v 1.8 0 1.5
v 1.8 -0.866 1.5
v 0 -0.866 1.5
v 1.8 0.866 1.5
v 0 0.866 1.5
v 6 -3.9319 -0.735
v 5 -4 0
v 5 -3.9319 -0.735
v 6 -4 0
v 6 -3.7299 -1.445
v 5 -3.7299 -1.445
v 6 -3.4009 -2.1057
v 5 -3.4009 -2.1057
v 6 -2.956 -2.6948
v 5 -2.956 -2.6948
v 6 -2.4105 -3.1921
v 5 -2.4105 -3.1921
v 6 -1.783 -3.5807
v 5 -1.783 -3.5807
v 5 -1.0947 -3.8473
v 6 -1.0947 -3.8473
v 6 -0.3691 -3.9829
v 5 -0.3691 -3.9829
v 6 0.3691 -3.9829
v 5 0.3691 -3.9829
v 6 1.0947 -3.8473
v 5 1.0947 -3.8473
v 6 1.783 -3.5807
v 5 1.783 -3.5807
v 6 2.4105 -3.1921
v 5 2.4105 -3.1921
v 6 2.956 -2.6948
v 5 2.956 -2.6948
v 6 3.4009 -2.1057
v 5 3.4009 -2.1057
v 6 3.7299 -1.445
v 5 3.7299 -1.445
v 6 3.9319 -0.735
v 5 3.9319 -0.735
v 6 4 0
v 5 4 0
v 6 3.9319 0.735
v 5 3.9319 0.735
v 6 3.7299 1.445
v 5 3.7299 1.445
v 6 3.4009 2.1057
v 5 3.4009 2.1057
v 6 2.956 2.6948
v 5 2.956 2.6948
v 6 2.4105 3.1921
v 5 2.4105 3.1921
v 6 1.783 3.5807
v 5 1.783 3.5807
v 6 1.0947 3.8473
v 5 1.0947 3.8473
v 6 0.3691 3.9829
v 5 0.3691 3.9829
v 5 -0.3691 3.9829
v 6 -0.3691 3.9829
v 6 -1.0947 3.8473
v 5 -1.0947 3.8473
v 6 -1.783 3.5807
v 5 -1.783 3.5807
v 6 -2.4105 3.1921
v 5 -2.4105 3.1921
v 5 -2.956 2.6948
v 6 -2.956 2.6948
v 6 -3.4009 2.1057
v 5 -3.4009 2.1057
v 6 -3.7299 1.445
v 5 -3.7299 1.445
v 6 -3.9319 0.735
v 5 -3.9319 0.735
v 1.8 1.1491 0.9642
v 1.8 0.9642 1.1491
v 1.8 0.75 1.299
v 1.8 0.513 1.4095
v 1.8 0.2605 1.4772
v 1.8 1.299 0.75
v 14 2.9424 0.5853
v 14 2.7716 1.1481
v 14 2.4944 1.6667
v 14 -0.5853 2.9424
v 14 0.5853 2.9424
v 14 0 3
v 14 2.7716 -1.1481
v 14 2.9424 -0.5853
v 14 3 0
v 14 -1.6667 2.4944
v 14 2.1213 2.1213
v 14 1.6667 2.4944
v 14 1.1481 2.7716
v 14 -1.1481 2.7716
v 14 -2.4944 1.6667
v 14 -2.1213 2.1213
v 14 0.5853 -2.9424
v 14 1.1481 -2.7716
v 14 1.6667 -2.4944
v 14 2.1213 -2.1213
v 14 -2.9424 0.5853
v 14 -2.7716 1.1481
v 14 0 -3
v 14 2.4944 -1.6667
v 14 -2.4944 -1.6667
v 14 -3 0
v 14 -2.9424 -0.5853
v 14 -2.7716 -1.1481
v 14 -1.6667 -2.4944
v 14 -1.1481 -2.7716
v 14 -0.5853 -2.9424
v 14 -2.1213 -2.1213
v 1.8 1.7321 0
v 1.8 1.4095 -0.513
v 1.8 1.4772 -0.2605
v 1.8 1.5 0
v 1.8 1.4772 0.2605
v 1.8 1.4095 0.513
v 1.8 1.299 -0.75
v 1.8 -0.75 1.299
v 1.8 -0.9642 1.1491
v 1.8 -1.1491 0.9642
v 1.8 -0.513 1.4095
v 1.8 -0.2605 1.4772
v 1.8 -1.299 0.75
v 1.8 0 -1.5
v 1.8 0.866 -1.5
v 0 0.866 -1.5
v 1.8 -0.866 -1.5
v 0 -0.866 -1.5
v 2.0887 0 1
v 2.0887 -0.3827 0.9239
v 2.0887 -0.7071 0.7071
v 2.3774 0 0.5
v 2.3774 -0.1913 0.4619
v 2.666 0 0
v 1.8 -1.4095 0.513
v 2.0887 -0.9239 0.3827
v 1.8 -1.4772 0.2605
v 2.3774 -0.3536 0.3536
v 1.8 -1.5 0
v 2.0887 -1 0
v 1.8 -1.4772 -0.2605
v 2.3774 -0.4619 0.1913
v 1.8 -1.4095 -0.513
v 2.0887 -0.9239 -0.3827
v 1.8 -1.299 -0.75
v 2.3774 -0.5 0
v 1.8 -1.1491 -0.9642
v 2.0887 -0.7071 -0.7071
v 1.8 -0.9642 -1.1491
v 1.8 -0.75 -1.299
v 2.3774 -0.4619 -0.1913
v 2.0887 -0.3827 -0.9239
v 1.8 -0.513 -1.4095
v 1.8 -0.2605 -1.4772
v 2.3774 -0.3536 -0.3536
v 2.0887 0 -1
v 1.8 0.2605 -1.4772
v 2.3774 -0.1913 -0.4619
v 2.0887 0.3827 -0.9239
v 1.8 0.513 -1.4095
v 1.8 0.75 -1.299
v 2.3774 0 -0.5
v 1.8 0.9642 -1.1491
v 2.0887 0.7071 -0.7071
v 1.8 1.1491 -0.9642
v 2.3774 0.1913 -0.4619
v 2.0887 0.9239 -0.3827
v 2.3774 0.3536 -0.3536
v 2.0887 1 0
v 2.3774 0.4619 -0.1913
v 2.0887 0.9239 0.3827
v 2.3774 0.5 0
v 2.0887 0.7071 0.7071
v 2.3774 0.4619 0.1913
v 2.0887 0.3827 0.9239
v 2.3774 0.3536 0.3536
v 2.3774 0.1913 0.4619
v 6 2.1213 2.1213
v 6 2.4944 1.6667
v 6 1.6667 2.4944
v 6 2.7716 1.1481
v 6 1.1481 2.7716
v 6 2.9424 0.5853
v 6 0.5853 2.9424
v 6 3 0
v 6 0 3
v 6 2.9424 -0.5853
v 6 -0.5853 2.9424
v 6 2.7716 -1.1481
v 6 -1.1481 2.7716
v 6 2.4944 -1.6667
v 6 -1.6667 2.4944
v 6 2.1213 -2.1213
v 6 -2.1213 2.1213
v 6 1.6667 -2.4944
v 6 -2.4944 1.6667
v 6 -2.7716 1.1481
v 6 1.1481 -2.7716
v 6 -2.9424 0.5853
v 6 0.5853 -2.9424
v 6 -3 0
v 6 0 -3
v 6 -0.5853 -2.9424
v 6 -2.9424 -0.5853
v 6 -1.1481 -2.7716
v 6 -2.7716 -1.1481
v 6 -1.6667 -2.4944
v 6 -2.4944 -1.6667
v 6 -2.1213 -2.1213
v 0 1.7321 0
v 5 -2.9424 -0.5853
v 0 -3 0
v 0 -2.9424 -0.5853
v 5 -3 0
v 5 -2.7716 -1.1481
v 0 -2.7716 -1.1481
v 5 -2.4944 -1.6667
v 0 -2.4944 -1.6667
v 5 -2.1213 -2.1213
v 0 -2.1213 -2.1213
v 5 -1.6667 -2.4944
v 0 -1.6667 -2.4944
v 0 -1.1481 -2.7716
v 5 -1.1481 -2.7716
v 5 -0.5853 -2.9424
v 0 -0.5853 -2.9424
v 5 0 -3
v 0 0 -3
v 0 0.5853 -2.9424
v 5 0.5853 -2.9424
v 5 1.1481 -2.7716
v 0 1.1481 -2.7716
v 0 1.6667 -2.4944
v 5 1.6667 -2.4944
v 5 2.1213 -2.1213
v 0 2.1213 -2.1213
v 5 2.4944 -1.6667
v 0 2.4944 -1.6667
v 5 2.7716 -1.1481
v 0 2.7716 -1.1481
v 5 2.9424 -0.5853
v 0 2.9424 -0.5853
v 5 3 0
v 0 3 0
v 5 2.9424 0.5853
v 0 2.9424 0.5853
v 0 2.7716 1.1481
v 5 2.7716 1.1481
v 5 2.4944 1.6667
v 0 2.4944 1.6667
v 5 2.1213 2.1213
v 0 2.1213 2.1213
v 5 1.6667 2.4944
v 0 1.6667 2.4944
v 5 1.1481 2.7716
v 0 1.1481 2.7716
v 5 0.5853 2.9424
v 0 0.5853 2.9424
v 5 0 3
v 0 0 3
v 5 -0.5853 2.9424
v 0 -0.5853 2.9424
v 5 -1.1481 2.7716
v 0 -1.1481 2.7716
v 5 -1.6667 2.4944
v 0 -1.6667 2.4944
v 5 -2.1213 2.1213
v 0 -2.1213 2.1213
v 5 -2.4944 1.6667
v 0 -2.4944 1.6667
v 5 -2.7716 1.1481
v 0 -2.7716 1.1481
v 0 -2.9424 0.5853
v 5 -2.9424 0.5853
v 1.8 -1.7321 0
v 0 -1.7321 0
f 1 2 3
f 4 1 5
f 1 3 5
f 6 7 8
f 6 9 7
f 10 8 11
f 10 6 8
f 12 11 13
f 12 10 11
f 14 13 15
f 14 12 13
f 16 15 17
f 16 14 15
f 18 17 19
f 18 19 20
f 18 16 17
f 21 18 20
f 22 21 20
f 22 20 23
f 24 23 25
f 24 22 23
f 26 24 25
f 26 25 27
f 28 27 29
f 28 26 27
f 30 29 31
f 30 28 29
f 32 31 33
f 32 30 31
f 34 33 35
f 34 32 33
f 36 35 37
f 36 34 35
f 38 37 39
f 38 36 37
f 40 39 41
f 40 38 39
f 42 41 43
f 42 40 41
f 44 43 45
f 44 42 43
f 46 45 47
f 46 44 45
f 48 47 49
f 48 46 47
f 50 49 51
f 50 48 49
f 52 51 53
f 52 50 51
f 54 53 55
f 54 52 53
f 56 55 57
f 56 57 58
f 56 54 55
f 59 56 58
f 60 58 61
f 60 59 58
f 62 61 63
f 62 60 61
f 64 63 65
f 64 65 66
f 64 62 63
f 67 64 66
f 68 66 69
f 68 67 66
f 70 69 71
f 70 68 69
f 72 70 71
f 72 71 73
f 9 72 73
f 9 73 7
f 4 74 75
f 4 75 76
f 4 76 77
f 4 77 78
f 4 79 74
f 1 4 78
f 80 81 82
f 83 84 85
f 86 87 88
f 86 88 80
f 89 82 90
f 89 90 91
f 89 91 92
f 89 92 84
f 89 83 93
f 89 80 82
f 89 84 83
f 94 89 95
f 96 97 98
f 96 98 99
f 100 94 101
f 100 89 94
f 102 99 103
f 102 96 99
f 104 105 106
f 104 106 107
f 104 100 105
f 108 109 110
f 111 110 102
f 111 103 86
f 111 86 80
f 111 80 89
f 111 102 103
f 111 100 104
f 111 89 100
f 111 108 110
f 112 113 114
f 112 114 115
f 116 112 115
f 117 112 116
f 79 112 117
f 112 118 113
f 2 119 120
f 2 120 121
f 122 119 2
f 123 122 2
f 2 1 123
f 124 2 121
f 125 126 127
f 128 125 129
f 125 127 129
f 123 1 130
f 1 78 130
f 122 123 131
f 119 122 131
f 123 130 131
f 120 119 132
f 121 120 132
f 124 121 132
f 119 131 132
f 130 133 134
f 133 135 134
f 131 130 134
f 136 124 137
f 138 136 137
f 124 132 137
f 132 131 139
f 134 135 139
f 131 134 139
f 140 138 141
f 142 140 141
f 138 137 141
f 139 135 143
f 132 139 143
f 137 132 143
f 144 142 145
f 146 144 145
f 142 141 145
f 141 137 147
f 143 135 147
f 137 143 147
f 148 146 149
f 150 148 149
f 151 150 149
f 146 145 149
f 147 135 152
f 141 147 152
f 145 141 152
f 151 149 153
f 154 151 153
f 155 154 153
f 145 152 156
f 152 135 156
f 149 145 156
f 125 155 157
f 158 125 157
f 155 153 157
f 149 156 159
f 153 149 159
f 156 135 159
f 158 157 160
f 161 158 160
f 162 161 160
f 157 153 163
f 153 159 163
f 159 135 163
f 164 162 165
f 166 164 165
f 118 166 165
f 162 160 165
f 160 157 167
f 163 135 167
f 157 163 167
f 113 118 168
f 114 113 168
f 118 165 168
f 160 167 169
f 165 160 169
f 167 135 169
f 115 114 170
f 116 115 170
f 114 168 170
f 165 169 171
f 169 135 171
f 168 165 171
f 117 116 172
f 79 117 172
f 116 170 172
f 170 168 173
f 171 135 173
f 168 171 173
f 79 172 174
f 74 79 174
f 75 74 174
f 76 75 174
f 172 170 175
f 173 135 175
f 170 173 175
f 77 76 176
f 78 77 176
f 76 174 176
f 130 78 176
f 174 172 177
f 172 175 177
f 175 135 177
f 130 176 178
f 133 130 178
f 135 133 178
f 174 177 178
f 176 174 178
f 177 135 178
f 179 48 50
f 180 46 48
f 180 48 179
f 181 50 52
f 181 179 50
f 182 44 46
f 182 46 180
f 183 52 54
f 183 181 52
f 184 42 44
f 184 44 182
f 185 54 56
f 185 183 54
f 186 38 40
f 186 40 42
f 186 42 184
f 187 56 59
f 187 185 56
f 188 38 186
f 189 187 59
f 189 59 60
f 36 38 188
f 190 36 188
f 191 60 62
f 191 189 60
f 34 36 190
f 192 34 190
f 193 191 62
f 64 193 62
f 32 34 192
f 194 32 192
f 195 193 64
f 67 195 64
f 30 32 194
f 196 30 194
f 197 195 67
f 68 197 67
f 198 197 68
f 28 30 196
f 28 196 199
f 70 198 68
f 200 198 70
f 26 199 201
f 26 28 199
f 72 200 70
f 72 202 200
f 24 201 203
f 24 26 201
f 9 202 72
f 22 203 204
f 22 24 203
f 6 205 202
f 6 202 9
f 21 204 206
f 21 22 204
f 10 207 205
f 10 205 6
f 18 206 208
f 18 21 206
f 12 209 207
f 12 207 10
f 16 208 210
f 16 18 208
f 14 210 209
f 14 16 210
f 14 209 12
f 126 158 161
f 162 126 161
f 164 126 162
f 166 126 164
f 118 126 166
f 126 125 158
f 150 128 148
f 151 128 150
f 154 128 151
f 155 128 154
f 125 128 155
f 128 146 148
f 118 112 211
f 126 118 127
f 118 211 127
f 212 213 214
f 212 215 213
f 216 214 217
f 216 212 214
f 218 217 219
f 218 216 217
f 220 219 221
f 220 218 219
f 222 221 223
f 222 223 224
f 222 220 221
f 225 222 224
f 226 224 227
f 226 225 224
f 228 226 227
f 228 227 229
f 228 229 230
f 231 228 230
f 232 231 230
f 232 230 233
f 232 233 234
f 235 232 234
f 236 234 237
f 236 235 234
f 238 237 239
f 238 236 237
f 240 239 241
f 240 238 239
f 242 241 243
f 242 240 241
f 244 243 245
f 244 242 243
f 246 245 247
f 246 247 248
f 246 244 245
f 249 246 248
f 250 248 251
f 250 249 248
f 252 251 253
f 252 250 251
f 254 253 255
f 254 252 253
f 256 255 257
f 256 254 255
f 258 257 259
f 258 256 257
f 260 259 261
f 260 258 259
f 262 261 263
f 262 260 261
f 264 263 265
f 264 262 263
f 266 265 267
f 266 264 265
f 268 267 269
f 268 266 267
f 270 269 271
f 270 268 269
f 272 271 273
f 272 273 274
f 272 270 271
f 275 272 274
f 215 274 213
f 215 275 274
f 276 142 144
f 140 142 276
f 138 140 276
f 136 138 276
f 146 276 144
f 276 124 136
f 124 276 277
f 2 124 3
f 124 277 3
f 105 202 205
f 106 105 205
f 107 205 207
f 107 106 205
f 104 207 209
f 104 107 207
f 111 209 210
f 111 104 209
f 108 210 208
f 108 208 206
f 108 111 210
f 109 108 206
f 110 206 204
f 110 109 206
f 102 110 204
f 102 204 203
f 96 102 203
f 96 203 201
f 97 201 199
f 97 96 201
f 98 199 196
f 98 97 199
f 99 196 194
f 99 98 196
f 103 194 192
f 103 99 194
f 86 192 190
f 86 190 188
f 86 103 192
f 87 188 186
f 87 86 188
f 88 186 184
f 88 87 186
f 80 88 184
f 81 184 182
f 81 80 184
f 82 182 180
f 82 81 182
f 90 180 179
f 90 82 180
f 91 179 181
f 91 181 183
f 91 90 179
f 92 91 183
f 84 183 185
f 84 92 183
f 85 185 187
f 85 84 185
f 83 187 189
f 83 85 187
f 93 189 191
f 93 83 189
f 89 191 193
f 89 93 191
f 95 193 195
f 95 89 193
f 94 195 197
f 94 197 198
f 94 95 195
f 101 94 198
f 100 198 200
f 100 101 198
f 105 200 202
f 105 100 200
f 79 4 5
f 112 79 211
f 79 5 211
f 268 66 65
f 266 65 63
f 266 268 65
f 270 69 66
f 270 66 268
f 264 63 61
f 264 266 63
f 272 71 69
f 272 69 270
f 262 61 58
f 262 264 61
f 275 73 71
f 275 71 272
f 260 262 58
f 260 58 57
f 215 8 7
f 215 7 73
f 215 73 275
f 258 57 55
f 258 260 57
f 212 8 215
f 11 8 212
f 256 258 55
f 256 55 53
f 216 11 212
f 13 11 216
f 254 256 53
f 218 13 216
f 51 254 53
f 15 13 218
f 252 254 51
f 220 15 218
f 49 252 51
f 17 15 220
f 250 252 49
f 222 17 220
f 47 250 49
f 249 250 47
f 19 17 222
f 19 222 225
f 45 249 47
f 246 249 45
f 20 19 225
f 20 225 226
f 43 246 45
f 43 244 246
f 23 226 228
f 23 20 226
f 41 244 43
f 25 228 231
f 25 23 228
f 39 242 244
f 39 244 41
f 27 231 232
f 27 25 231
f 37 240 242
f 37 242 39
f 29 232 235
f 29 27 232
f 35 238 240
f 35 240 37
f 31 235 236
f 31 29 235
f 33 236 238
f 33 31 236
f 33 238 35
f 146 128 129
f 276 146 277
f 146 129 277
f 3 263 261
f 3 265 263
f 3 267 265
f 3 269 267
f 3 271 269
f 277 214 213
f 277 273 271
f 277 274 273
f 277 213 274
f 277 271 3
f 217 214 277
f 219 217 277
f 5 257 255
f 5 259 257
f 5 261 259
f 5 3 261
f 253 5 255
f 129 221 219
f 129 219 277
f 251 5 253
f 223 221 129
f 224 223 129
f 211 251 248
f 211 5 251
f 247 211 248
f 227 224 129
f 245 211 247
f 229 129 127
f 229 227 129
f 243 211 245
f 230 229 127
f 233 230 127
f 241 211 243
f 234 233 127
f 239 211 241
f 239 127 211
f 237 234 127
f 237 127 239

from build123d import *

# Parameters (mm, degrees)
CUT_EXTRUDE1_DEPTH = 1.8


with BuildPart() as part:
    # Sketch1 → Revolve1 (revolve)
    with BuildSketch(Plane.XY, mode=Mode.PRIVATE) as revolve1_sk:
        Polygon((0, 0), (0, 3), (5, 3), (5, 4), (6, 4), (6, 3), (14, 3), (14, 0), align=None)
    revolve(revolve1_sk.sketch.rotate(Axis((0, 0, 0), (1, 0, 0)), 180), axis=Axis((0, 0, 0), (1, 0, 0)))

    # Sketch2 → Cut-Revolve1 (revolve, cut)
    with BuildSketch(Plane.XY, mode=Mode.PRIVATE) as cut_revolve1_sk:
        Polygon((0, 0), (0, 1.5), (1.8, 1.5), (2.666025404, 0), align=None)
    revolve(cut_revolve1_sk.sketch.rotate(Axis((0, 0, 0), (1, 0, 0)), 90), axis=Axis((0, 0, 0), (1, 0, 0)), mode=Mode.SUBTRACT)

    # Sketch3 → Cut-Extrude1 (cut)
    with BuildSketch(Plane.ZY):
        Polygon((0, 1.732050808), (-1.5, 0.866025404), (-1.5, -0.866025404), (0, -1.732050808), (1.5, -0.866025404), (1.5, 0.866025404), align=None)
    extrude(amount=-CUT_EXTRUDE1_DEPTH, mode=Mode.SUBTRACT)


solid = part.part
